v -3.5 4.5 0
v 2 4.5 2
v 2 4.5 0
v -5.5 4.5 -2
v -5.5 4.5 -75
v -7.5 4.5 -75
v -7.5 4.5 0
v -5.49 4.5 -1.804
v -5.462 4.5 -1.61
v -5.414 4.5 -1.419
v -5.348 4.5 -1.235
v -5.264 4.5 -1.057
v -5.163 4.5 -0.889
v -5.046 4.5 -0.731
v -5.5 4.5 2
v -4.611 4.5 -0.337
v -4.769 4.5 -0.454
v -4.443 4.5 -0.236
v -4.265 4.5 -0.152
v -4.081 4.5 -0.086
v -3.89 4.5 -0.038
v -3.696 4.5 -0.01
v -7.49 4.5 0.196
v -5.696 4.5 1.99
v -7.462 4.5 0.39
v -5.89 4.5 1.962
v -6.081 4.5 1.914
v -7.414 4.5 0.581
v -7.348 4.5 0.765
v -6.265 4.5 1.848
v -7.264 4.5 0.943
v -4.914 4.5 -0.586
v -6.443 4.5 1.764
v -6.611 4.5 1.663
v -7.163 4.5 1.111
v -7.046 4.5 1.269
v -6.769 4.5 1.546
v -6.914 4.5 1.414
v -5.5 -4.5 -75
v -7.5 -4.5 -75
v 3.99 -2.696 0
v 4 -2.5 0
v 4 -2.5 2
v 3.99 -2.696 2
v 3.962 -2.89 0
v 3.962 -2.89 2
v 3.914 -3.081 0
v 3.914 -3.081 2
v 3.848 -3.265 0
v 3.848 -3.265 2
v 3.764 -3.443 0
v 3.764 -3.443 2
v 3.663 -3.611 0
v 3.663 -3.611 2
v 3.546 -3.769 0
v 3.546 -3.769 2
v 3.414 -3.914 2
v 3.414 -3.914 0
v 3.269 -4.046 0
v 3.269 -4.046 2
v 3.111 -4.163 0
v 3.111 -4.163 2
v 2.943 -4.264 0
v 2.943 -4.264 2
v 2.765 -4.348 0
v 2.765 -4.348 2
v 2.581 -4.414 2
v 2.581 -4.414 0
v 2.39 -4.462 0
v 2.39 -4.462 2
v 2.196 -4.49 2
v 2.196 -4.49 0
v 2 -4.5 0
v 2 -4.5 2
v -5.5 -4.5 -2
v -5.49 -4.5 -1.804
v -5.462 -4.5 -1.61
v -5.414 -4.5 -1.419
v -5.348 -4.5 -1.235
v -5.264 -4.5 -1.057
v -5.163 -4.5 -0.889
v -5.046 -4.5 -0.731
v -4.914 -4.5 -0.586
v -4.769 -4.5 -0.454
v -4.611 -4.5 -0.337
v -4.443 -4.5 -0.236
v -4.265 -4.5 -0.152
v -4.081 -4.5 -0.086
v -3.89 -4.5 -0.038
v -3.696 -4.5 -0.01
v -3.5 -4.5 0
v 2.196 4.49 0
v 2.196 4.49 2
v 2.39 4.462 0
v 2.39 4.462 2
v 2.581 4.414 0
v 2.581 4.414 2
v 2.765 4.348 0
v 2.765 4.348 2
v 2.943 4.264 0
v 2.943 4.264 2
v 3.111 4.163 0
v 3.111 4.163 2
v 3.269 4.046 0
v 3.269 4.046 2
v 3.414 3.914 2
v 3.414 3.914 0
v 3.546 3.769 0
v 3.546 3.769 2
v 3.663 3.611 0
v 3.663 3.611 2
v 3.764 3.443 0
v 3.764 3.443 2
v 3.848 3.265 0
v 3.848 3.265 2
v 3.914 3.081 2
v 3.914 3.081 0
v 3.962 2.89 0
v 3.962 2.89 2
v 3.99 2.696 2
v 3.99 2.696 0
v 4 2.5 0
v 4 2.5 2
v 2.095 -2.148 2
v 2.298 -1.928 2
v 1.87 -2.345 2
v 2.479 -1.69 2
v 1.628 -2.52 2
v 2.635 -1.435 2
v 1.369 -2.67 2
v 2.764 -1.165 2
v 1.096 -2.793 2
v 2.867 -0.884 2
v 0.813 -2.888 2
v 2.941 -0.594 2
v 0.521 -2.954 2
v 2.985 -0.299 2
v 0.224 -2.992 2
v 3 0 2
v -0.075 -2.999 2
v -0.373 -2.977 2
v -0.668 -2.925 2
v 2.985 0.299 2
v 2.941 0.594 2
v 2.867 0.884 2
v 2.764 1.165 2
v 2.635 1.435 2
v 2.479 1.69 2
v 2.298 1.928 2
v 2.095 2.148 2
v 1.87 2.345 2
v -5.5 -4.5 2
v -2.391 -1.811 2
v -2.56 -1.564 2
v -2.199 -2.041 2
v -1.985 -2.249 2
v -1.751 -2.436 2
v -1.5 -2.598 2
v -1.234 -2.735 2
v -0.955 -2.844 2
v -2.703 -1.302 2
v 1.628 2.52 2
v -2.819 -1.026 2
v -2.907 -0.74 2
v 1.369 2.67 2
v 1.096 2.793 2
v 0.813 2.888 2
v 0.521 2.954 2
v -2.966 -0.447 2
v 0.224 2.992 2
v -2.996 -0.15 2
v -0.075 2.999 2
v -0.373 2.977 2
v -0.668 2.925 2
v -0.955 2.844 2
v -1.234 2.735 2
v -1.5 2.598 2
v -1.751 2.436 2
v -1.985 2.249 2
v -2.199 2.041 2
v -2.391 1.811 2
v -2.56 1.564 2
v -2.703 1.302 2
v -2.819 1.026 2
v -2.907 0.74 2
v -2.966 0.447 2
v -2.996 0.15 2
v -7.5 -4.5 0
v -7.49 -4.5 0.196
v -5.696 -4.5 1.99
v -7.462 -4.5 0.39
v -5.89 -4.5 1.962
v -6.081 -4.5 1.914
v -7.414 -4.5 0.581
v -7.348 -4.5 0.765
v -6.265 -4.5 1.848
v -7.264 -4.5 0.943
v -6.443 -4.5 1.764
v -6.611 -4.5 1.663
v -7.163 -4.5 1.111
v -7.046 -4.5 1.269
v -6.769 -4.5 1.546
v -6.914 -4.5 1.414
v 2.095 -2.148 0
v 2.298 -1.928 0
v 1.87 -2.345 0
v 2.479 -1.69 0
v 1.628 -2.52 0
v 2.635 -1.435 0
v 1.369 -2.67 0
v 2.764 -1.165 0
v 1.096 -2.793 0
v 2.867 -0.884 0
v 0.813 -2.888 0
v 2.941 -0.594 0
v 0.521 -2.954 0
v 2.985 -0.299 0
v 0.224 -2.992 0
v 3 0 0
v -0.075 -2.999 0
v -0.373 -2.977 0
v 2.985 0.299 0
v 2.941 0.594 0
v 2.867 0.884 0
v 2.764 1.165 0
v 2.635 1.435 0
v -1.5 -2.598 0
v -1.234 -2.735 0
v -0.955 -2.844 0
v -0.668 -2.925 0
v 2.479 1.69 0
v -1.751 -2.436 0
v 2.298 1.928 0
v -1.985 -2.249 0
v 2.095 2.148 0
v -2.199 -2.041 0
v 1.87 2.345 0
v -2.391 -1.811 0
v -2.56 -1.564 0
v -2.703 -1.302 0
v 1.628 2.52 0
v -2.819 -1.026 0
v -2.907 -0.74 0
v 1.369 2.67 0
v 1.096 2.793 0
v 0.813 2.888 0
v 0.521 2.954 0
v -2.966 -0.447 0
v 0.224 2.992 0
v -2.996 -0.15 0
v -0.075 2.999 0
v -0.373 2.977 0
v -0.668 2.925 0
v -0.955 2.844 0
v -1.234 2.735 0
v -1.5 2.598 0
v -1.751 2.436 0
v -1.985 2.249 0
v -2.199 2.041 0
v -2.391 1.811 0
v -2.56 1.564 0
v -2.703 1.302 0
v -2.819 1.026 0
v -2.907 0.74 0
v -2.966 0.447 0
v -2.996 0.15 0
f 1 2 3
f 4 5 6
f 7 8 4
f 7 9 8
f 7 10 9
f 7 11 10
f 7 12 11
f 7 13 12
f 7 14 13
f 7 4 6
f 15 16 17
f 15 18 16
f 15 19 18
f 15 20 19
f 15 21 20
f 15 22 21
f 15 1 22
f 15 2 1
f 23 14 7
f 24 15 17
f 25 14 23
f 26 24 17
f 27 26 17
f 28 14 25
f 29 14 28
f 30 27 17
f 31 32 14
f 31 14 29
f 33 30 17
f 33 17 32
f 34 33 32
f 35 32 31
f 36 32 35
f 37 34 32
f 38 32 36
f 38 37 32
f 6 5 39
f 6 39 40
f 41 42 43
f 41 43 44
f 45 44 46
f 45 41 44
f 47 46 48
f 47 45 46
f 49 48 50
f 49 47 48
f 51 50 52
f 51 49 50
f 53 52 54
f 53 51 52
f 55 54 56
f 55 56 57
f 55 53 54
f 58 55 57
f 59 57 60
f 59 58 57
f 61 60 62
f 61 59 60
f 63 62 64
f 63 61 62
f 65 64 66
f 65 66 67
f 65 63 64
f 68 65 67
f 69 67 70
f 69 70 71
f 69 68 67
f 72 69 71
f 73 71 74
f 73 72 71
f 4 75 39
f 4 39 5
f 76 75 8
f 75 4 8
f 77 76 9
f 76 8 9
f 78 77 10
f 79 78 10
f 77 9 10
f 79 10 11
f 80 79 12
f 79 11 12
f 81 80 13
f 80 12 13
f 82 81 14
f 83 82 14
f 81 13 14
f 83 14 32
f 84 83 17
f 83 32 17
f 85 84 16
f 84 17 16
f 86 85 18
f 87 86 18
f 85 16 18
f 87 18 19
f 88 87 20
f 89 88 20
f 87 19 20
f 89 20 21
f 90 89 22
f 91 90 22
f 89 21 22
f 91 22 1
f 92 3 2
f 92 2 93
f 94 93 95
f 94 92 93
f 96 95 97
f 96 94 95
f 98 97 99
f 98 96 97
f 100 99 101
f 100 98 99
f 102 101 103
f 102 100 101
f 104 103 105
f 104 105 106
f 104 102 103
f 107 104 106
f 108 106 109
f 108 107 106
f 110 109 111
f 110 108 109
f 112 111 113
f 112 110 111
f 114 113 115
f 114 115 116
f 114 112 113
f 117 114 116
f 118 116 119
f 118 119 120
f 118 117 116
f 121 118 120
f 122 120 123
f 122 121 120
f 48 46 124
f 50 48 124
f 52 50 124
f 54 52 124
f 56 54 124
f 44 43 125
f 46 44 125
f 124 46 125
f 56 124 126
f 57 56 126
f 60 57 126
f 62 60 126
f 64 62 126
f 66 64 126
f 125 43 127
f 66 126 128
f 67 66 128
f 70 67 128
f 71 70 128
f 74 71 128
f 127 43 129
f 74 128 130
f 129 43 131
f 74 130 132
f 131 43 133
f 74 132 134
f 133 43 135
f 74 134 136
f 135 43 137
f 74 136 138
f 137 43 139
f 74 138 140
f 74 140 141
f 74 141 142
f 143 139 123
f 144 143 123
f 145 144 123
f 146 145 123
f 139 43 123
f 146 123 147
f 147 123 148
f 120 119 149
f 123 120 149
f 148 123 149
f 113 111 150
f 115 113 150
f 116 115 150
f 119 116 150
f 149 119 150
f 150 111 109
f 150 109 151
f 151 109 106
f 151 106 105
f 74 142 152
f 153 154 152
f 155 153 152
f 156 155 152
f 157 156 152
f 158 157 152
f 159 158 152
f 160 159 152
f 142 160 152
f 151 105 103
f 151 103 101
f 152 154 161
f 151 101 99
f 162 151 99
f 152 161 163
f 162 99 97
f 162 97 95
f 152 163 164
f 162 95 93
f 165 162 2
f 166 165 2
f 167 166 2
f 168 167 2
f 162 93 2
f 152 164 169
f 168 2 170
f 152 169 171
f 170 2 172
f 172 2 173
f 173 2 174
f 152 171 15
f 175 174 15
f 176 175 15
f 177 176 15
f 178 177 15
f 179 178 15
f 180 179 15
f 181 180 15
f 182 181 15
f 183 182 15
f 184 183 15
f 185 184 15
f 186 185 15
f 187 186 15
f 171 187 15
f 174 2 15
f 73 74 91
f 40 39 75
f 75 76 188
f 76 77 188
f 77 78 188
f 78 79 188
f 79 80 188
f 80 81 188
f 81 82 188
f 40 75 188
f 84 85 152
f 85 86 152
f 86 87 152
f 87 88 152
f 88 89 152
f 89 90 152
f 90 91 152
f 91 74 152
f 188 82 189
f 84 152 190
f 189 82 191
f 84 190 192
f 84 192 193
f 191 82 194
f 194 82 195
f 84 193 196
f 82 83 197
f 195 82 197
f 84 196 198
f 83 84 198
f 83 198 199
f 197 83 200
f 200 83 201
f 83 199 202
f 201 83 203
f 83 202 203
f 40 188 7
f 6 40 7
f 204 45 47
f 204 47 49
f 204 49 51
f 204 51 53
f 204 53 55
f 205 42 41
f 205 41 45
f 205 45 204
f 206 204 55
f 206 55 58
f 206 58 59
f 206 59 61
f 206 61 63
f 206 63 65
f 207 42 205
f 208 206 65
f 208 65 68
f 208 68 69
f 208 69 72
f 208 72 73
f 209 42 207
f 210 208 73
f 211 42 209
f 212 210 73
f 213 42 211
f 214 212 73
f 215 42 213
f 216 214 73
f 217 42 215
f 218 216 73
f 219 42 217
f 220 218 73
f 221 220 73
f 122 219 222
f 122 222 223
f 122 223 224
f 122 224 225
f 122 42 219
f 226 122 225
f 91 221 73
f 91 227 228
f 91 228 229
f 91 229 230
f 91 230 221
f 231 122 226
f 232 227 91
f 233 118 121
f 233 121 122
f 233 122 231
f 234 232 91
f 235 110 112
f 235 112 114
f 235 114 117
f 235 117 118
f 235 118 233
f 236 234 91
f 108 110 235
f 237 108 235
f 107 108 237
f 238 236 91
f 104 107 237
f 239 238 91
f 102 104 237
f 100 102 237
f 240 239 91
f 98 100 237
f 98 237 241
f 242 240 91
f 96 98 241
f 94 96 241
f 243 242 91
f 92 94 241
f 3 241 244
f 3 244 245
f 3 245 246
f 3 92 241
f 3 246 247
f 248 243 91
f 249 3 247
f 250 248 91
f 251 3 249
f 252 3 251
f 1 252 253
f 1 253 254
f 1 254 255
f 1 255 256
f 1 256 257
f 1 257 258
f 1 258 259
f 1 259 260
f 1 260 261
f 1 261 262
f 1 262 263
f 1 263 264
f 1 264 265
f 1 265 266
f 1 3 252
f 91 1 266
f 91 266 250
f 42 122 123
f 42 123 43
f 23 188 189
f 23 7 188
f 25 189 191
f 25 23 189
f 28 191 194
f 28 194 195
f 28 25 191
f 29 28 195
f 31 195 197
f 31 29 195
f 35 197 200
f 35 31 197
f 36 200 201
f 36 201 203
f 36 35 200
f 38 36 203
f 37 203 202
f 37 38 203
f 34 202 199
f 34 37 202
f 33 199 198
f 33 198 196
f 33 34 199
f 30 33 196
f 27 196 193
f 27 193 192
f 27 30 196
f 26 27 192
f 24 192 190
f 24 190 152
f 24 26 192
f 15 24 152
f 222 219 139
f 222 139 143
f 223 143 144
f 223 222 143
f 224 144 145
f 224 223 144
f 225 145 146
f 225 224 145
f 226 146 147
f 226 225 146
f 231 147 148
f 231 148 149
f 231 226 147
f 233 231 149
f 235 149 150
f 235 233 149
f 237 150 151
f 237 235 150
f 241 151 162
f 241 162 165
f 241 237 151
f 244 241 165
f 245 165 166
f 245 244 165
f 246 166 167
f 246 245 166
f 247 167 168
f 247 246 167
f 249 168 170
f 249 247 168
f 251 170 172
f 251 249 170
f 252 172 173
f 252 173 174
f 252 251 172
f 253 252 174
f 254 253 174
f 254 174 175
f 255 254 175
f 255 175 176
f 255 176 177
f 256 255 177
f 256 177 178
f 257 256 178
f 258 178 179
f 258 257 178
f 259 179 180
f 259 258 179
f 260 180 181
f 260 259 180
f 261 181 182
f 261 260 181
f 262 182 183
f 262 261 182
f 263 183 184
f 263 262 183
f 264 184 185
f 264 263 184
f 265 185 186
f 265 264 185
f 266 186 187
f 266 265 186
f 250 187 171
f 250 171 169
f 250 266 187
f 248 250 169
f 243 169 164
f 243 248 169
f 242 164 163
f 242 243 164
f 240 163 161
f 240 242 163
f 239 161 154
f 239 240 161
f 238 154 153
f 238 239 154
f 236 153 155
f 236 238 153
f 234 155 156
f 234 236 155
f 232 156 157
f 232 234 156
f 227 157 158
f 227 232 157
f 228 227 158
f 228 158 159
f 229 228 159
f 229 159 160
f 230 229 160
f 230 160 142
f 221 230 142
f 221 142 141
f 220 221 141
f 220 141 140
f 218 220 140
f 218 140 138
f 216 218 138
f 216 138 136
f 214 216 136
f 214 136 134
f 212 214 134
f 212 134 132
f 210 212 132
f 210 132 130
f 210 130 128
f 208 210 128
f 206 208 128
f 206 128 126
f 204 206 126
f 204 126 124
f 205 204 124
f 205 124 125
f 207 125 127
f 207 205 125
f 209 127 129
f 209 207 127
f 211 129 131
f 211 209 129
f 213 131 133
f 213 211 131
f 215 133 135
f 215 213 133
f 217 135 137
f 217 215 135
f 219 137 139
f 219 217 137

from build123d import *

# Parameters (mm, degrees)
SKETCH1_R           = 3
BOSS_EXTRUDE1_DEPTH = 2
SKETCH2_W           = 2
SKETCH2_H           = 9
BOSS_EXTRUDE2_DEPTH = 75
FILLET1_R           = 2


with BuildPart() as part:
    # Sketch1 → Boss-Extrude1 (new body)
    with BuildSketch(Plane.XY):
        with BuildLine():
            Line((-7.5, 4.5), (2, 4.5))
            ThreePointArc((2, 4.5), (3.414213562, 3.914213562), (4, 2.5))
            Line((4, 2.5), (4, -2.5))
            ThreePointArc((4, -2.5), (3.414213562, -3.914213562), (2, -4.5))
            Line((2, -4.5), (-7.5, -4.5))
            Line((-7.5, -4.5), (-7.5, 4.5))
        make_face()
        Circle(SKETCH1_R, mode=Mode.SUBTRACT)
    extrude(amount=BOSS_EXTRUDE1_DEPTH)

    # Sketch2 → Boss-Extrude2 (add)
    with BuildSketch(Plane(origin=(0, 0, 0), x_dir=(-1, 0, 0), z_dir=(0, 0, -1))):
        with Locations((6.5, 0)):
            Rectangle(SKETCH2_W, SKETCH2_H)
    extrude(amount=BOSS_EXTRUDE2_DEPTH)

    # Fillet1
    fillet1_edges = [part.edges().sort_by_distance(p)[0] for p in [
        (-5.5, 0, 0),
        (-7.5, 0, 2),
    ]]
    fillet(fillet1_edges, radius=FILLET1_R)


solid = part.part
